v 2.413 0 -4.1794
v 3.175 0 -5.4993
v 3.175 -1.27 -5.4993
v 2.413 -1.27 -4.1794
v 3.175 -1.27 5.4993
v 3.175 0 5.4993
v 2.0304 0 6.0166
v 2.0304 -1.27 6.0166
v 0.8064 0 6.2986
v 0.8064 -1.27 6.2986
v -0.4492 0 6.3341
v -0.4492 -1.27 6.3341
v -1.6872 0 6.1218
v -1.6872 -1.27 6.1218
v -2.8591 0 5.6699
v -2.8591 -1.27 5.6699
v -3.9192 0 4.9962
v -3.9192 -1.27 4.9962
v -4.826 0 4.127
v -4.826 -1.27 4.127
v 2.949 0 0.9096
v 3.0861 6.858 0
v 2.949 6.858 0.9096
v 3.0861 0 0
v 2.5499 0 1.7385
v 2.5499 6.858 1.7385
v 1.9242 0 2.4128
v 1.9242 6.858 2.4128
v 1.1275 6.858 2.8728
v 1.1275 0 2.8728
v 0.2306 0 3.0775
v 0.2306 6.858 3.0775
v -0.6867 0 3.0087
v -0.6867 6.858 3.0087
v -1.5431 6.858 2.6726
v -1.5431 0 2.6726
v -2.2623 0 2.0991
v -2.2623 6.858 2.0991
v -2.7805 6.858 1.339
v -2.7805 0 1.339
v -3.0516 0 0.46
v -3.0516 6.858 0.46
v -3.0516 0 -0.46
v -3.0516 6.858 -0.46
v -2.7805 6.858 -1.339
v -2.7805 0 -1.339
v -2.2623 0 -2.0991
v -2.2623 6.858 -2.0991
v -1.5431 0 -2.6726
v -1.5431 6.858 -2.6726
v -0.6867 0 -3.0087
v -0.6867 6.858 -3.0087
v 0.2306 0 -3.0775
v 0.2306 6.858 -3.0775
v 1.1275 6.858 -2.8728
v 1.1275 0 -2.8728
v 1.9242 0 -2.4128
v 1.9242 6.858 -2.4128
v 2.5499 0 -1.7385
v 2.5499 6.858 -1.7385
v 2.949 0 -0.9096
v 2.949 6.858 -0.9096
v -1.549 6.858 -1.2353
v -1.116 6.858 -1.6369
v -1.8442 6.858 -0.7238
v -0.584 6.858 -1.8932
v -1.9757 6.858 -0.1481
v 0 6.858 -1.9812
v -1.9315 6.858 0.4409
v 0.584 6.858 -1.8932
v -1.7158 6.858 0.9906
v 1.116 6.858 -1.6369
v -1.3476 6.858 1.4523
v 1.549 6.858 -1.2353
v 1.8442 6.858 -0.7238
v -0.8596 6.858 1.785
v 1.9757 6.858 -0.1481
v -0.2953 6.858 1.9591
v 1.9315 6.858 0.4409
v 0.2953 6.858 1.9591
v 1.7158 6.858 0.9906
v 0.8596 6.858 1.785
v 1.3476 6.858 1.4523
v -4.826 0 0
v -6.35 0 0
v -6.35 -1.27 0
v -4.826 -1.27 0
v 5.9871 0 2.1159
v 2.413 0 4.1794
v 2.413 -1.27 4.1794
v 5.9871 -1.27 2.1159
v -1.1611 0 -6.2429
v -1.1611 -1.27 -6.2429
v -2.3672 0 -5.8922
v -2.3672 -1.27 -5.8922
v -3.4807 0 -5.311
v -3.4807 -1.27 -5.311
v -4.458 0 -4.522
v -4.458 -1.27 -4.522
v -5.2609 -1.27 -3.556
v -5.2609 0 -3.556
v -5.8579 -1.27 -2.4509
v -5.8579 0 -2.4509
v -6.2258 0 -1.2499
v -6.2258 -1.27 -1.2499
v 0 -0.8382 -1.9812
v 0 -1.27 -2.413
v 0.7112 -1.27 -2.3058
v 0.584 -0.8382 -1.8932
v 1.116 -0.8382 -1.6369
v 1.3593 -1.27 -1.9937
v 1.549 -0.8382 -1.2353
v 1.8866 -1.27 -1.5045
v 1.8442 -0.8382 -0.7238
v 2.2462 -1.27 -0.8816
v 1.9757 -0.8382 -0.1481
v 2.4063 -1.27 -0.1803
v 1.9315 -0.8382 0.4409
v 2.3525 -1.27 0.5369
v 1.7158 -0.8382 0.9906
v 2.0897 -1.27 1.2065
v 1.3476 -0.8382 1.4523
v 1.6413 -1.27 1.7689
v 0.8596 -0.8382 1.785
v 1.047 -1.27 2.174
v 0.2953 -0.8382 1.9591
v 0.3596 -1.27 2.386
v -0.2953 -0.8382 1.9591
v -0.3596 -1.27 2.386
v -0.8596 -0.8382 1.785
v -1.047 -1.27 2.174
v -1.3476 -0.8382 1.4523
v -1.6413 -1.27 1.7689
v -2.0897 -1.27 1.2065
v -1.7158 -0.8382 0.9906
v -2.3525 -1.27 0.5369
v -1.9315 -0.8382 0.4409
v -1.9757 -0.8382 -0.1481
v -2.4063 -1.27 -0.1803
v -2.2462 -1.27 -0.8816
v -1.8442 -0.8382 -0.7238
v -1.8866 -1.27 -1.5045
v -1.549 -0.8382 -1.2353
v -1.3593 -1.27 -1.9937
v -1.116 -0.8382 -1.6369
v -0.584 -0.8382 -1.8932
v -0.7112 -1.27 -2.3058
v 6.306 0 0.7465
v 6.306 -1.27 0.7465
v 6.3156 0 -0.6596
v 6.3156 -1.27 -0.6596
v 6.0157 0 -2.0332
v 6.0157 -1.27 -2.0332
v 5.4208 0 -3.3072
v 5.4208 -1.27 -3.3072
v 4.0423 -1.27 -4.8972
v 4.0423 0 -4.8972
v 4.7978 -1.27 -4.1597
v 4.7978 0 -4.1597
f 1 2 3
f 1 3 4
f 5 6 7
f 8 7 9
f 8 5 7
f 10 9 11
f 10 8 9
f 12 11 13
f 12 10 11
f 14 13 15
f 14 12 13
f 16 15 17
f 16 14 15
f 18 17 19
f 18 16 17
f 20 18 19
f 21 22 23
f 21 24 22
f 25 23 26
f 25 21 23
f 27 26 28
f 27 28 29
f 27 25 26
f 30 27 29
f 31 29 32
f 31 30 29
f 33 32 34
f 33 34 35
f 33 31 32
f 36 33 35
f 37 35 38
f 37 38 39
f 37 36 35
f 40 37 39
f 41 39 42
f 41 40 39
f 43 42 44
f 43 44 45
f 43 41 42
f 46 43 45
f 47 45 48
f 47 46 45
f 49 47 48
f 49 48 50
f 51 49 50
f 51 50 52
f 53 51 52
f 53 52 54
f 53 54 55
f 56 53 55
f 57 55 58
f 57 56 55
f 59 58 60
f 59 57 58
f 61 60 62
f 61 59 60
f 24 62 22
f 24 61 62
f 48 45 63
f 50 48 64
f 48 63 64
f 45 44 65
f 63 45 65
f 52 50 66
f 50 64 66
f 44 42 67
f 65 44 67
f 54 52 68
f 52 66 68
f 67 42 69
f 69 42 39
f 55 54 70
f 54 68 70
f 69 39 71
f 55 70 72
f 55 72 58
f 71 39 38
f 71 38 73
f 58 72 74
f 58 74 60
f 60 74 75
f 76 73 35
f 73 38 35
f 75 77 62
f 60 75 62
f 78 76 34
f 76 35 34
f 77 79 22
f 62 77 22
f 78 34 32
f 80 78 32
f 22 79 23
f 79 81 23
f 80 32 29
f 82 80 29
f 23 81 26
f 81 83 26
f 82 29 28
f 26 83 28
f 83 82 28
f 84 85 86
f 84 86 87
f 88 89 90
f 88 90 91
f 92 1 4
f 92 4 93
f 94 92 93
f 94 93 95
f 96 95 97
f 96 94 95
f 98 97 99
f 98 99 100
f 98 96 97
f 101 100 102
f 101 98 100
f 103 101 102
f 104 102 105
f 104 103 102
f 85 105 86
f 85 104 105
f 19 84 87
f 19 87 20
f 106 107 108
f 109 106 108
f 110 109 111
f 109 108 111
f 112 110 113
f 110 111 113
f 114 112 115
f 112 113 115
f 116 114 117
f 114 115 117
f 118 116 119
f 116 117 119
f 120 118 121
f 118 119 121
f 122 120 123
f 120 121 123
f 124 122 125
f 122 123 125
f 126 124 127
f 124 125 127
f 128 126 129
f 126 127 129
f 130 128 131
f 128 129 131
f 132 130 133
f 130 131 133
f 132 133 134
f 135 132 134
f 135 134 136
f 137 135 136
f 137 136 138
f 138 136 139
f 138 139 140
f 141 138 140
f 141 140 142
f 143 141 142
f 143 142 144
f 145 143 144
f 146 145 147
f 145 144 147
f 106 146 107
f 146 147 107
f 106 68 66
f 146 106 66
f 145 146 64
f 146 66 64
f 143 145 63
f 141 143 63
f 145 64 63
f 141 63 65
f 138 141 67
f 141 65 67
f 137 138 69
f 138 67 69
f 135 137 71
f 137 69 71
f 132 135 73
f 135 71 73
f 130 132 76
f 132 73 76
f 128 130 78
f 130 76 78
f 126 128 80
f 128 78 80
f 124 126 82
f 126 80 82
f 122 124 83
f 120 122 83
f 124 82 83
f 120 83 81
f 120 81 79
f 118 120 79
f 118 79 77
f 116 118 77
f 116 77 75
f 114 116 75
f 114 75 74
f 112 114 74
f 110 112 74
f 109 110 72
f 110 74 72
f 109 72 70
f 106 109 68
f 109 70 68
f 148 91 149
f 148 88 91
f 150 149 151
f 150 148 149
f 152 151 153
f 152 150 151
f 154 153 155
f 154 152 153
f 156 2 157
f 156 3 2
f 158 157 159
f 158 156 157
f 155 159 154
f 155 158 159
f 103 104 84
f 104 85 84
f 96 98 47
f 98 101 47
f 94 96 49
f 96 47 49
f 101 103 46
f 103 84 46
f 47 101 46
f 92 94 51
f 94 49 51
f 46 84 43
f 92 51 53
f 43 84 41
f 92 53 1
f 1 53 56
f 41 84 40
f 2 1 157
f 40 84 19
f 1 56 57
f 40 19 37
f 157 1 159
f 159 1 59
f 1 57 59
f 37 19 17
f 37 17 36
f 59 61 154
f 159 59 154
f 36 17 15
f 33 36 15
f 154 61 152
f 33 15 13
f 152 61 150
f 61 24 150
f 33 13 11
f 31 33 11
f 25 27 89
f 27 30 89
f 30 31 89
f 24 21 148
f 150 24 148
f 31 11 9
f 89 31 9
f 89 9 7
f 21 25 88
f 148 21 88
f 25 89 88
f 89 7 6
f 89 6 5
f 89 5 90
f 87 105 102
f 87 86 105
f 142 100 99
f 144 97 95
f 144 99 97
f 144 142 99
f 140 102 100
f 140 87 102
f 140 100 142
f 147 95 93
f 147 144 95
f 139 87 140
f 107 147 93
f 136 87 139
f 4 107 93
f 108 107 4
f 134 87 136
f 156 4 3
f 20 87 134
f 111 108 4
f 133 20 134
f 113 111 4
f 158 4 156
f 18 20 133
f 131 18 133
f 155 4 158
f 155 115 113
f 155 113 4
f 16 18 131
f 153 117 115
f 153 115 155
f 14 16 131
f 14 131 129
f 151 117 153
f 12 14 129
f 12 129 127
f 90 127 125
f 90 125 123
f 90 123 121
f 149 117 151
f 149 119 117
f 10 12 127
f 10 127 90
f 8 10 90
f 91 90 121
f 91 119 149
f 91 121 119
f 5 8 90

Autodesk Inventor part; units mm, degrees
sketch "Sketch_1" plane through (0, 0, 0) normal (0, 0, 1) x (1, 0, 0)
  line L0 (0, -1.27) -> (0, 6.858)
  line L1 (0, 6.858) -> (3.0861, 6.858)
  line L2 (3.0861, 6.858) -> (3.0861, 0)
  line L3 (3.0861, 0) -> (6.35, 0)
  line L4 (6.35, 0) -> (6.35, -1.27)
  line L5 (6.35, -1.27) -> (0, -1.27)
  line L6 (0, -1.27) -> (0, 6.858)
revolve "Revolution1" add sketch "Sketch_1" angle 360 about axis through (0, -1.27, 0) along (0, -1, 0)
sketch "Sketch2" plane through (0, -1.27, 0) normal (0, -1, 0) x (1, 0, 0)
  point P0 (0, 0)
hole "Drilling 1" at (0, -1.27, 0) direction (0, 1, 0) diameter 3.9624 depth 8.128 countersink diameter 4.826 countersink angle 90 thread size "10-32 UNF" class "2B" standard "ANSI Unified Screw Threads"
sketch "Sketch_3" plane through (0, 0, 0) normal (0, 1, 0) x (-1, 0, 0)
  circle A0 centre (0, 0) radius 8.89
  line L0 (6.35, 0) -> (4.826, 0)
  line L1 (4.826, 0) -> (4.826, 4.127)
  arc A1 (4.826, 4.127) -> (-3.175, 5.4993) centre (0, 0) ccw
  line L2 (-3.175, 5.4993) -> (-2.413, 4.1794)
  line L3 (-2.413, 4.1794) -> (-5.9871, 2.1159)
  arc A2 (-5.9871, 2.1159) -> (-3.175, -5.4993) centre (0, 0) ccw
  line L4 (-3.175, -5.4993) -> (-2.413, -4.1794)
  line L5 (-2.413, -4.1794) -> (1.1611, -6.2429)
  arc A3 (1.1611, -6.2429) -> (6.35, 0) centre (0, 0) ccw
extrude "Extrusion1" cut sketch "Sketch_3" against normal blind 2.54
ref_plane "insert_XY" through (0, 0, 0) normal (0, 1, 0) x (1, 0, 0)
ref_plane "insert_YZ" through (0, 0, 0) normal (1, 0, 0) x (0, 0, -1)
ref_plane "insert_ZX" through (0, 0, 0) normal (0, 0, -1) x (0, 1, 0)
properties part number "6895_insert" material "Stainless Steel"
